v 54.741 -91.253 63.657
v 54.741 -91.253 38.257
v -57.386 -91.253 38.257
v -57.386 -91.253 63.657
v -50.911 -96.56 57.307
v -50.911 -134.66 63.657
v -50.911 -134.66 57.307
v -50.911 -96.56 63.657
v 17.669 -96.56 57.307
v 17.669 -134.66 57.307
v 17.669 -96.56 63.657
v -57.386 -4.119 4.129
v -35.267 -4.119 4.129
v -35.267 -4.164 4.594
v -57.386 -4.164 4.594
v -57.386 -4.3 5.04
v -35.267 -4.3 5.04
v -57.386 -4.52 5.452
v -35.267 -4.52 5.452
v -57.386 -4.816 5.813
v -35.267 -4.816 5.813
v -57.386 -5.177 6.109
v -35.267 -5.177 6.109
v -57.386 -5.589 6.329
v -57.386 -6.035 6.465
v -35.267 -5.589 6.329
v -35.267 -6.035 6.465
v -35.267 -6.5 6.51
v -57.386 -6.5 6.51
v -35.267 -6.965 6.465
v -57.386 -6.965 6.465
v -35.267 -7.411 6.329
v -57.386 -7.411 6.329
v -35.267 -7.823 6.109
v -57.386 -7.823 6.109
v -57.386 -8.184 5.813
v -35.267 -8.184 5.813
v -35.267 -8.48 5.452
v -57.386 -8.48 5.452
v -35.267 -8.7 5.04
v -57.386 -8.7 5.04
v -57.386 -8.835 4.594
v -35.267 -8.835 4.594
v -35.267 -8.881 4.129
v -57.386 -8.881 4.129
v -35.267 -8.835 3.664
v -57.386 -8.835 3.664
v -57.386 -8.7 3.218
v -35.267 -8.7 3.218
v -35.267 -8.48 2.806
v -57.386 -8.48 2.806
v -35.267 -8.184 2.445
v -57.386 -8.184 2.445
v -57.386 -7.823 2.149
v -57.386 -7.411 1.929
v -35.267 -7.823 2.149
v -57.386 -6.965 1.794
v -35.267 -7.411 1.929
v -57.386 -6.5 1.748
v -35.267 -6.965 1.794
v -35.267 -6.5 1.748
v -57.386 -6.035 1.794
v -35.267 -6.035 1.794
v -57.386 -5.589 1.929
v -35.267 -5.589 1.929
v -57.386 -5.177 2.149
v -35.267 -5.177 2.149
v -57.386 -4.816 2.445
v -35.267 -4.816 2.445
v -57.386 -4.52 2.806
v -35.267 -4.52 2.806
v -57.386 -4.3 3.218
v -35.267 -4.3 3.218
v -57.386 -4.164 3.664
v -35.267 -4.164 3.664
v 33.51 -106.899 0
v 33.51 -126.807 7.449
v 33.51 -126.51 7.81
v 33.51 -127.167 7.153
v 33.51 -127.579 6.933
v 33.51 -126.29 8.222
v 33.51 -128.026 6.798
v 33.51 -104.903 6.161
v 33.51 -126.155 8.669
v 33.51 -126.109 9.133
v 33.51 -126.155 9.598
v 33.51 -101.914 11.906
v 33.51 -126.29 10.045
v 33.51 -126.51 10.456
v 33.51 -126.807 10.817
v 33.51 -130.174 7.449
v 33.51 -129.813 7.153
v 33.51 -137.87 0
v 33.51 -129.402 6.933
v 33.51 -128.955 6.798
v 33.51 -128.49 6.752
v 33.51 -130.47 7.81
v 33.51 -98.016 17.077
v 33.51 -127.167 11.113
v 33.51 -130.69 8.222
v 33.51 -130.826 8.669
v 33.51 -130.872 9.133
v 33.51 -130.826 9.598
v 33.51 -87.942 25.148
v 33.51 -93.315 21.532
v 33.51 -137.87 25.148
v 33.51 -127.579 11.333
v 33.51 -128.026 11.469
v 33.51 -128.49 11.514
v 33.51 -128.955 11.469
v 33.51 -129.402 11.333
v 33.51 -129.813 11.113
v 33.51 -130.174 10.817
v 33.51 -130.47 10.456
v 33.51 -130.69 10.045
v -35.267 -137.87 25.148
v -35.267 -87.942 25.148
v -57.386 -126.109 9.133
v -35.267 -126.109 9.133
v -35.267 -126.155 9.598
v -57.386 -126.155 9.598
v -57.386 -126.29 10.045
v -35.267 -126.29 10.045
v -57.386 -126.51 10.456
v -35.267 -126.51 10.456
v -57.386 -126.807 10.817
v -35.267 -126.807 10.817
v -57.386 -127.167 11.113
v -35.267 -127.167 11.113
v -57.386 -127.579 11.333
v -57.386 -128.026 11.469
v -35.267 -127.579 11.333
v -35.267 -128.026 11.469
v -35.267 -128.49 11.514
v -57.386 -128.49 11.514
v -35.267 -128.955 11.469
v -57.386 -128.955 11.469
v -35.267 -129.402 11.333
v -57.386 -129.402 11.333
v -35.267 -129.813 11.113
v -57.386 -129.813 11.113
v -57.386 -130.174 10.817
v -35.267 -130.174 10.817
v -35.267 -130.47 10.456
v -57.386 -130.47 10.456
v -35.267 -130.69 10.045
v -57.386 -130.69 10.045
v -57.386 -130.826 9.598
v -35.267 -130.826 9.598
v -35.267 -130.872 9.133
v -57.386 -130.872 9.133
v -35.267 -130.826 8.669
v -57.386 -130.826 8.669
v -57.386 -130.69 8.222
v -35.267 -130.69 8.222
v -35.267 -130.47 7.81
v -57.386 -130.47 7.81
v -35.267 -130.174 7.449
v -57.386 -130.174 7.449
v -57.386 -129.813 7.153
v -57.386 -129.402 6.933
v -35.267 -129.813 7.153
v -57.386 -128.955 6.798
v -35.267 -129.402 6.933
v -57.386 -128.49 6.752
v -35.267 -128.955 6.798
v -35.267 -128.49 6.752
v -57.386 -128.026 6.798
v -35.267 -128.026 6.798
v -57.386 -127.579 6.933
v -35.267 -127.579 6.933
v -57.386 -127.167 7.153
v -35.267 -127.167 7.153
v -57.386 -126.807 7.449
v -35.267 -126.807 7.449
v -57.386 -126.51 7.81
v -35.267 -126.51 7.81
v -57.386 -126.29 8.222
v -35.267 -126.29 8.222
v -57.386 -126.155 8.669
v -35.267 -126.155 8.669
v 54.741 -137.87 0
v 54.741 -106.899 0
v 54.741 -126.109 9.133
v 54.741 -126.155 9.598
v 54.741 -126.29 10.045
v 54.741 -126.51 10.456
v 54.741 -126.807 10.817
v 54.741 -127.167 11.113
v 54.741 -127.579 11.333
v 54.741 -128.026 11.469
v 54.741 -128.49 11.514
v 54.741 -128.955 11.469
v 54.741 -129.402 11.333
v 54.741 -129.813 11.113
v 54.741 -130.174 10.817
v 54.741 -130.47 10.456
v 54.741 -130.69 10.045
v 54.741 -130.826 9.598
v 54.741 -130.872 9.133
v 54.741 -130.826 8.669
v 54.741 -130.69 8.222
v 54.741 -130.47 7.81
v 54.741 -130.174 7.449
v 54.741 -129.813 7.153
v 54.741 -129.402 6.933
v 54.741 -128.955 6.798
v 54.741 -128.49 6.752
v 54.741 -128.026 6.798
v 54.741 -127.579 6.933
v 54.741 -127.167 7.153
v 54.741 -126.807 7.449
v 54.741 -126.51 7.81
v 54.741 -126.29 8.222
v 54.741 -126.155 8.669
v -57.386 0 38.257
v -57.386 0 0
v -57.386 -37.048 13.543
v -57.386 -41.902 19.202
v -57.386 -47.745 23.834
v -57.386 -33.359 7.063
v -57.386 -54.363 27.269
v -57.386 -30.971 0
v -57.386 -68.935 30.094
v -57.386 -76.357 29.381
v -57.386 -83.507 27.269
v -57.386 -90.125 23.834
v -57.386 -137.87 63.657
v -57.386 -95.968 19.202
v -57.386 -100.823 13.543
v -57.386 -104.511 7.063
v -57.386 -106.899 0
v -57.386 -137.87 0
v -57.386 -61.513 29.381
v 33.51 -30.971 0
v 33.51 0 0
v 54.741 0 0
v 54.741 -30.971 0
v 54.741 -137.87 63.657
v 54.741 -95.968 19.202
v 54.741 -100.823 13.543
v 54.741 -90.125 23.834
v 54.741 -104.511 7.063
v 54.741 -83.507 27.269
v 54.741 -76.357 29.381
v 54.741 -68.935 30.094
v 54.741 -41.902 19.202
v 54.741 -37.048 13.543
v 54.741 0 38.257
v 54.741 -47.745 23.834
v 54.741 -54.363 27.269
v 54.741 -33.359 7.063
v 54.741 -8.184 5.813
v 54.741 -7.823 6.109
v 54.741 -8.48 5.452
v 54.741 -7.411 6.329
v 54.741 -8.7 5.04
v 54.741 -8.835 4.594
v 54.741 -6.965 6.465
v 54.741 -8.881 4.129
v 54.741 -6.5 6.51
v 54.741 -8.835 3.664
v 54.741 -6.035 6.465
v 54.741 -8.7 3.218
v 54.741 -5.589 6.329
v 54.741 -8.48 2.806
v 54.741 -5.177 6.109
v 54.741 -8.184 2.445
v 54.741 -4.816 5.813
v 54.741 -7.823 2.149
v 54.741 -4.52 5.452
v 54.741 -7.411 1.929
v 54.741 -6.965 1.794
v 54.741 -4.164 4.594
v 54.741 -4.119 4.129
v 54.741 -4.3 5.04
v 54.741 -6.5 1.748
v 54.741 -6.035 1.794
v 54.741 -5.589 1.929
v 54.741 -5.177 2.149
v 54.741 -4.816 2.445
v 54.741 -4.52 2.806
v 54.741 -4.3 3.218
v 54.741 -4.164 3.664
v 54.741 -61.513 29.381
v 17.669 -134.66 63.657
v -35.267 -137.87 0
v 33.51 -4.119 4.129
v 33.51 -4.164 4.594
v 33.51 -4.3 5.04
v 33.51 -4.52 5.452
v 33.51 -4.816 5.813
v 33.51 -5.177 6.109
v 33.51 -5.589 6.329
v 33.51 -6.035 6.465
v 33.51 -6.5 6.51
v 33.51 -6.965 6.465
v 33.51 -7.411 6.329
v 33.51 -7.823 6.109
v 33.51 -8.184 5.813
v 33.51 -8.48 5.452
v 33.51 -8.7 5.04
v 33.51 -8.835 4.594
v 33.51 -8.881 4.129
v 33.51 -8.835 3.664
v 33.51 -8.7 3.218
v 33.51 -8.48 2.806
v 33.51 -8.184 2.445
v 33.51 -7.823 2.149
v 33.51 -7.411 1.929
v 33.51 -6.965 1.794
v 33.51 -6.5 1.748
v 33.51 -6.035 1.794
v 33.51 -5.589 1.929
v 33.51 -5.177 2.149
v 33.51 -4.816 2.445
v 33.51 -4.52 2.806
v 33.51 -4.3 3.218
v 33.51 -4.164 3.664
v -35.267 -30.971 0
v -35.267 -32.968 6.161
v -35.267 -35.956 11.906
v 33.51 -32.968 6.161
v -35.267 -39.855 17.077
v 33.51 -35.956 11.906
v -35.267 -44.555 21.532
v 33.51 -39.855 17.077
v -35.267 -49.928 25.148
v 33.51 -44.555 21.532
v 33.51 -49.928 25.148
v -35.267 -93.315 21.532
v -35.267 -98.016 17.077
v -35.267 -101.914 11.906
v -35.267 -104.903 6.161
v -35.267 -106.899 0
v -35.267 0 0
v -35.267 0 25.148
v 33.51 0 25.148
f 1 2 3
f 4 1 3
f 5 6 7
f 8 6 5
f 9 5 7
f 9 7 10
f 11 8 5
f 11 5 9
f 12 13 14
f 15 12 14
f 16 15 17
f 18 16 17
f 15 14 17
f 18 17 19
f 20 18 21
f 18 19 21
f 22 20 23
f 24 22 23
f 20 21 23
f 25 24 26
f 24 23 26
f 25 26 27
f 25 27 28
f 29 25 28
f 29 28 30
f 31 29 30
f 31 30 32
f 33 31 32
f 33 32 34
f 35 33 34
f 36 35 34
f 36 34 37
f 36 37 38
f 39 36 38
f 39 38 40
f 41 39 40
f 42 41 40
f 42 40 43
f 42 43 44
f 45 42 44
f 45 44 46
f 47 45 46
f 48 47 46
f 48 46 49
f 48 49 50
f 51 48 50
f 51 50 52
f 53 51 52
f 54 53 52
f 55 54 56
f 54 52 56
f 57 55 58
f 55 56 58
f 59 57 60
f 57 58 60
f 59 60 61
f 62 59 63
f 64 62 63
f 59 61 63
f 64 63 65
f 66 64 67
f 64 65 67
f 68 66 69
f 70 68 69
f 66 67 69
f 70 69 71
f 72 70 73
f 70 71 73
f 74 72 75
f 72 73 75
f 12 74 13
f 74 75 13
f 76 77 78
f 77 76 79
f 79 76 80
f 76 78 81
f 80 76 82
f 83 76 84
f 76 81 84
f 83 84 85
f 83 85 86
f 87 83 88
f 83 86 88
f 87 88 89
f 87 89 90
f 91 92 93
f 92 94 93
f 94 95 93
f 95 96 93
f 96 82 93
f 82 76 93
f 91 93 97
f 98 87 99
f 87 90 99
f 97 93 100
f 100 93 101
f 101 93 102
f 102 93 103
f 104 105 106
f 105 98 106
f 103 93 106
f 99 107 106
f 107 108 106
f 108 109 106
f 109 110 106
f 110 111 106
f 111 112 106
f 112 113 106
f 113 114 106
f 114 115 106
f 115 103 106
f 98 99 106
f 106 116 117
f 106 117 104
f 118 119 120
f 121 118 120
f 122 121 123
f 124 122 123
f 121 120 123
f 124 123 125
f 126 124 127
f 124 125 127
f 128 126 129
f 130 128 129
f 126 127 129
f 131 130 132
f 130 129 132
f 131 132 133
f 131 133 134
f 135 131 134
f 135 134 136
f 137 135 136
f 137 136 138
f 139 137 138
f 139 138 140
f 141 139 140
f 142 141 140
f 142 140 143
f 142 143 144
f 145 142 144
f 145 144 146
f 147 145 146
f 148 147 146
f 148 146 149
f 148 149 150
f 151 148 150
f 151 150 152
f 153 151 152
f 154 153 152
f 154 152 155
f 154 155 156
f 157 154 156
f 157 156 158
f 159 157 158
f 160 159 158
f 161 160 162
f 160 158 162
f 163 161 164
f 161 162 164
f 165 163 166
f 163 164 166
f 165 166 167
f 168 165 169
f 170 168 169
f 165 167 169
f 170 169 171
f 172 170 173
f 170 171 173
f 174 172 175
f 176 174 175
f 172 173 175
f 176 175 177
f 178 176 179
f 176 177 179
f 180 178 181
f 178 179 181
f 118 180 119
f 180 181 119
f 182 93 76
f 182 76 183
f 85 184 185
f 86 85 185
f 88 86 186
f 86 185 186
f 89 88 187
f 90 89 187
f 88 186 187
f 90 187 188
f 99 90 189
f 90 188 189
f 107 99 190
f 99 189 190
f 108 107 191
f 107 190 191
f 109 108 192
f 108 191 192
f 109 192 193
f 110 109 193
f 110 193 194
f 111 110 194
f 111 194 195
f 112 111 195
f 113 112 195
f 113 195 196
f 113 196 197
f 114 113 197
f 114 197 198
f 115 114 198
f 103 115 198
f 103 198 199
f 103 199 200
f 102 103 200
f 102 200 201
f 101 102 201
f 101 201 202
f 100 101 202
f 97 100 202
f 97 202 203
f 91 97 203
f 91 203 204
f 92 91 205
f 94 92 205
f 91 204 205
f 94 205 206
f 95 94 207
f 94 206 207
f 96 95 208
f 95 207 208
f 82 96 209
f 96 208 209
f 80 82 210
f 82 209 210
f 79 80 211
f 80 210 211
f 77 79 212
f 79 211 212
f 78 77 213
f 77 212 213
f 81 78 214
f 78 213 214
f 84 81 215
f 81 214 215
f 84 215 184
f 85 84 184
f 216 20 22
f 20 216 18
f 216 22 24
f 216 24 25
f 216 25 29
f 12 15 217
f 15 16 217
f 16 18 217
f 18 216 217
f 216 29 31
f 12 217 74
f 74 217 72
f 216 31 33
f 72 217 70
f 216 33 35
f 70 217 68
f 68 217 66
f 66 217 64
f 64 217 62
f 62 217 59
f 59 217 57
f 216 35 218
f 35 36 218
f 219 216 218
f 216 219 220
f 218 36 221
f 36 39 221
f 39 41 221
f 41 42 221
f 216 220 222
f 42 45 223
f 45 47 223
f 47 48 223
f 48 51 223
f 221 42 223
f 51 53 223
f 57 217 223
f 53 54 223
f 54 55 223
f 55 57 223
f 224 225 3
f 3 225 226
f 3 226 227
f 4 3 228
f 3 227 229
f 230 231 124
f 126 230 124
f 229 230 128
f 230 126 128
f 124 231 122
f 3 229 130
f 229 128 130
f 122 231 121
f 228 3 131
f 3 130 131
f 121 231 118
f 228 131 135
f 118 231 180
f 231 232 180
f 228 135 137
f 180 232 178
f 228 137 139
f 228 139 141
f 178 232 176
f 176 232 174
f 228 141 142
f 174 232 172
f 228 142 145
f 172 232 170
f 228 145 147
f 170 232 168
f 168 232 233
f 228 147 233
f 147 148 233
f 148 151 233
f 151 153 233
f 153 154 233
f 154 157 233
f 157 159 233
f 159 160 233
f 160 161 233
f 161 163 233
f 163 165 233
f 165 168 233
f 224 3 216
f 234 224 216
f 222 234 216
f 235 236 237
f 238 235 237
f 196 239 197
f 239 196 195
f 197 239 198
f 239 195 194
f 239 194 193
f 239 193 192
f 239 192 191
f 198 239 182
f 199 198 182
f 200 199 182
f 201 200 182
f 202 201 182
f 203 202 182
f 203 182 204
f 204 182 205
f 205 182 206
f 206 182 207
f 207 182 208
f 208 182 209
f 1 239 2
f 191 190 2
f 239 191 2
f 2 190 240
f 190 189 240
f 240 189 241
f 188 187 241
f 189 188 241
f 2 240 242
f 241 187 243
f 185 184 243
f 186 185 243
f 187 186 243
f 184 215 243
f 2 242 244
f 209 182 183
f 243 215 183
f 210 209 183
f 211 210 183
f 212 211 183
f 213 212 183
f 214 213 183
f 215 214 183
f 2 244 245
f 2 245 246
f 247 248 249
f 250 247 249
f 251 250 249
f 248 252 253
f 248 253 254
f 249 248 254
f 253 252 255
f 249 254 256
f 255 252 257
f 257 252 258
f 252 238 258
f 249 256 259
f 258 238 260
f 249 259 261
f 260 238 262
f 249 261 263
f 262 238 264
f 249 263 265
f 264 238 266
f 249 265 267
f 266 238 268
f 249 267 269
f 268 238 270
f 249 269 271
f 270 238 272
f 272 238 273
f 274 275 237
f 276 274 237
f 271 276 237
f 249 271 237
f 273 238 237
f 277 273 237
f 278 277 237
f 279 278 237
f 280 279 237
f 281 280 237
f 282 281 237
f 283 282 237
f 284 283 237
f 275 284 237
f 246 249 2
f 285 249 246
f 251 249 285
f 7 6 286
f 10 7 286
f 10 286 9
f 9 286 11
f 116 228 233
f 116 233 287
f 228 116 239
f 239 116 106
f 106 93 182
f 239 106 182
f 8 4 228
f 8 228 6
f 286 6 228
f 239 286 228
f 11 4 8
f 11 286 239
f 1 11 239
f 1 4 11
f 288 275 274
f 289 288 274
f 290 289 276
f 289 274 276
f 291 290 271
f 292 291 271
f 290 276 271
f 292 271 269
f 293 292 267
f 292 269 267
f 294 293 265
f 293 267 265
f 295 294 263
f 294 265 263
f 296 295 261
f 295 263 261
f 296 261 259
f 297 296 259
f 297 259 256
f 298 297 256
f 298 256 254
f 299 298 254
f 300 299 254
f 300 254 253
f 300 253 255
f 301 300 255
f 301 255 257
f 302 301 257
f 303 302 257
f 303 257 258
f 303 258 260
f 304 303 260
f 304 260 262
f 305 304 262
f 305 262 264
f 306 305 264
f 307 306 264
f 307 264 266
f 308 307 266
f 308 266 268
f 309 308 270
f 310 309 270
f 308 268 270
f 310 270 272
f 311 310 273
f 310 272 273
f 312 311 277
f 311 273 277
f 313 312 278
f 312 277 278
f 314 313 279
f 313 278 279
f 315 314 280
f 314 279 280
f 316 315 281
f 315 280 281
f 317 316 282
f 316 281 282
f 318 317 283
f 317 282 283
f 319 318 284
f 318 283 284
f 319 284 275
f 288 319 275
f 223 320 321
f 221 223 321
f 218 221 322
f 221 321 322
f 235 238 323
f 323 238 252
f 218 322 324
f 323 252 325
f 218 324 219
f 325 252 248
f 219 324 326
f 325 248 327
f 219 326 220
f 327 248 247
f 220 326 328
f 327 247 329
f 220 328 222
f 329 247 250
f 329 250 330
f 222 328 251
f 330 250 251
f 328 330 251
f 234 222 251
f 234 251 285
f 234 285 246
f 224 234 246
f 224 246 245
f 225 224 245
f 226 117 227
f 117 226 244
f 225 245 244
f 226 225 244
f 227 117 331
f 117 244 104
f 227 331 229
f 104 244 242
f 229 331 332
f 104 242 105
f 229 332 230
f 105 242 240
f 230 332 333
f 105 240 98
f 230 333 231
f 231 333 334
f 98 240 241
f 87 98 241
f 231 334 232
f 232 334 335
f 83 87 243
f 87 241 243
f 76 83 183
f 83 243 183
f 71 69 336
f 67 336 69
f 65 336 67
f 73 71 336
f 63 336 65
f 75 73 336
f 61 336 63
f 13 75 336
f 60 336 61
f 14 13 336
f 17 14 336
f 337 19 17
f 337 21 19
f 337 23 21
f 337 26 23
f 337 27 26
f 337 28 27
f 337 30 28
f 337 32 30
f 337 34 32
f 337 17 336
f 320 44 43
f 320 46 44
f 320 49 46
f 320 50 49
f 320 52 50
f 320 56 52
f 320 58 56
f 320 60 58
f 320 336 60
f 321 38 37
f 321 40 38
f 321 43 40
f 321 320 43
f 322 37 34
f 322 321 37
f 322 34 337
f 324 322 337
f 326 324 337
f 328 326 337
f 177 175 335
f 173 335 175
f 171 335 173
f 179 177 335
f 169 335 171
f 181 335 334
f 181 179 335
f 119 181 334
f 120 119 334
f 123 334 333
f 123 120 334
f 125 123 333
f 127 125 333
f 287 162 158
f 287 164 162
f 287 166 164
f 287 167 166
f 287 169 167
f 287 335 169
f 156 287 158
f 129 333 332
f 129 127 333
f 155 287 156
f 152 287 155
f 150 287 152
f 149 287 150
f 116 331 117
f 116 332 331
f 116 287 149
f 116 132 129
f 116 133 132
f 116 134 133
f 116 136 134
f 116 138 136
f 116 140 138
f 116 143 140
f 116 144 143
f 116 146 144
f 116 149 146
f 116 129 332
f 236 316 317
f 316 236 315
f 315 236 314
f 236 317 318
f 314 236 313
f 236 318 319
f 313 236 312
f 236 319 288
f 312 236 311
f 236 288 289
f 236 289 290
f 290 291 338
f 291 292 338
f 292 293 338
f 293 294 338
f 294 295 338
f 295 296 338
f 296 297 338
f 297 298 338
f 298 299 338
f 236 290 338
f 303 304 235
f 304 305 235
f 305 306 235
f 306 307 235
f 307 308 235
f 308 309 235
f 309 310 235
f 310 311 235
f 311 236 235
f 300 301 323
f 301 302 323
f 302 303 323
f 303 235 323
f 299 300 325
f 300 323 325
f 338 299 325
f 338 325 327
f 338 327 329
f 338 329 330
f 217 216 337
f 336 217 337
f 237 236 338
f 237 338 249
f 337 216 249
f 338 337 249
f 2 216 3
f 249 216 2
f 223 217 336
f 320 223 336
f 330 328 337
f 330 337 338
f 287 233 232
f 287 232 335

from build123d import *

# Parameters (mm, degrees)
F0_W      = 112.1267676353
F0_H      = 38.257420063
F1_DEPTH  = 137.870118022
F2_W      = 68.7767341733
F2_H      = 25.1477137208
F3_DEPTH  = 137.871118022
F4_R      = 2.38125
F5_DEPTH  = 112.1277676353
F6_R      = 2.38125
F7_DEPTH  = 112.1277676353
F9_DEPTH  = 112.1277676353
F11_DEPTH = 25.4
F12_W     = 68.58
F12_H     = 38.1
F13_DEPTH = 6.35


with BuildPart() as f1:
    # F0 (on Front) → F1 (new body)
    with BuildSketch(Plane.XZ):
        with Locations((-1.3227313757, 19.1287100315)):
            Rectangle(F0_W, F0_H)
    extrude(amount=F1_DEPTH)

    # F2 (on face) → F3 (cut, through all)
    with BuildSketch(Plane.XZ.offset(137.870118022)):
        with Locations((-0.8782893419, 12.5738568604)):
            Rectangle(F2_W, F2_H)
    extrude(amount=-F3_DEPTH, mode=Mode.SUBTRACT)

    # F4 (on face) → F5 (cut, through all)
    with BuildSketch(Plane.YZ.offset(54.740652442)):
        with Locations((-128.4904330969, 9.1332495213)):
            Circle(F4_R)
    extrude(amount=-F5_DEPTH, mode=Mode.SUBTRACT)

    # F6 (on face) → F7 (cut, through all)
    with BuildSketch(Plane.YZ.offset(54.740652442)):
        with Locations((-6.499979645, 4.1290447116)):
            Circle(F6_R)
    extrude(amount=-F7_DEPTH, mode=Mode.SUBTRACT)

    # F8 (on face) → F9 (cut, through all)
    with BuildSketch(Plane.YZ.offset(54.740652442)):
        with BuildLine():
            Line((-106.8989974441, 0), (-30.9711205779, 0))
            ThreePointArc((-30.9711205779, 0), (-68.935059011, 30.0939472481), (-106.8989974441, 0))
        make_face()
    extrude(amount=-F9_DEPTH, mode=Mode.SUBTRACT)

    # F10 (on face) → F11 (join)
    with BuildSketch(Plane.XY.offset(38.257420063)):
        Polygon((54.740652442, -91.2534669042), (0, -91.2534669042), (-57.3861151934, -91.2534669042), (-57.3861151934, -137.870118022), (54.740652442, -137.870118022), align=None)
    extrude(amount=F11_DEPTH)

    # F12 (on face) → F13 (cut)
    with BuildSketch(Plane.XY.offset(63.657420063)):
        with Locations((-16.6207363016, -115.6102344394)):
            Rectangle(F12_W, F12_H)
    extrude(amount=-F13_DEPTH, mode=Mode.SUBTRACT)


solid = f1.part
